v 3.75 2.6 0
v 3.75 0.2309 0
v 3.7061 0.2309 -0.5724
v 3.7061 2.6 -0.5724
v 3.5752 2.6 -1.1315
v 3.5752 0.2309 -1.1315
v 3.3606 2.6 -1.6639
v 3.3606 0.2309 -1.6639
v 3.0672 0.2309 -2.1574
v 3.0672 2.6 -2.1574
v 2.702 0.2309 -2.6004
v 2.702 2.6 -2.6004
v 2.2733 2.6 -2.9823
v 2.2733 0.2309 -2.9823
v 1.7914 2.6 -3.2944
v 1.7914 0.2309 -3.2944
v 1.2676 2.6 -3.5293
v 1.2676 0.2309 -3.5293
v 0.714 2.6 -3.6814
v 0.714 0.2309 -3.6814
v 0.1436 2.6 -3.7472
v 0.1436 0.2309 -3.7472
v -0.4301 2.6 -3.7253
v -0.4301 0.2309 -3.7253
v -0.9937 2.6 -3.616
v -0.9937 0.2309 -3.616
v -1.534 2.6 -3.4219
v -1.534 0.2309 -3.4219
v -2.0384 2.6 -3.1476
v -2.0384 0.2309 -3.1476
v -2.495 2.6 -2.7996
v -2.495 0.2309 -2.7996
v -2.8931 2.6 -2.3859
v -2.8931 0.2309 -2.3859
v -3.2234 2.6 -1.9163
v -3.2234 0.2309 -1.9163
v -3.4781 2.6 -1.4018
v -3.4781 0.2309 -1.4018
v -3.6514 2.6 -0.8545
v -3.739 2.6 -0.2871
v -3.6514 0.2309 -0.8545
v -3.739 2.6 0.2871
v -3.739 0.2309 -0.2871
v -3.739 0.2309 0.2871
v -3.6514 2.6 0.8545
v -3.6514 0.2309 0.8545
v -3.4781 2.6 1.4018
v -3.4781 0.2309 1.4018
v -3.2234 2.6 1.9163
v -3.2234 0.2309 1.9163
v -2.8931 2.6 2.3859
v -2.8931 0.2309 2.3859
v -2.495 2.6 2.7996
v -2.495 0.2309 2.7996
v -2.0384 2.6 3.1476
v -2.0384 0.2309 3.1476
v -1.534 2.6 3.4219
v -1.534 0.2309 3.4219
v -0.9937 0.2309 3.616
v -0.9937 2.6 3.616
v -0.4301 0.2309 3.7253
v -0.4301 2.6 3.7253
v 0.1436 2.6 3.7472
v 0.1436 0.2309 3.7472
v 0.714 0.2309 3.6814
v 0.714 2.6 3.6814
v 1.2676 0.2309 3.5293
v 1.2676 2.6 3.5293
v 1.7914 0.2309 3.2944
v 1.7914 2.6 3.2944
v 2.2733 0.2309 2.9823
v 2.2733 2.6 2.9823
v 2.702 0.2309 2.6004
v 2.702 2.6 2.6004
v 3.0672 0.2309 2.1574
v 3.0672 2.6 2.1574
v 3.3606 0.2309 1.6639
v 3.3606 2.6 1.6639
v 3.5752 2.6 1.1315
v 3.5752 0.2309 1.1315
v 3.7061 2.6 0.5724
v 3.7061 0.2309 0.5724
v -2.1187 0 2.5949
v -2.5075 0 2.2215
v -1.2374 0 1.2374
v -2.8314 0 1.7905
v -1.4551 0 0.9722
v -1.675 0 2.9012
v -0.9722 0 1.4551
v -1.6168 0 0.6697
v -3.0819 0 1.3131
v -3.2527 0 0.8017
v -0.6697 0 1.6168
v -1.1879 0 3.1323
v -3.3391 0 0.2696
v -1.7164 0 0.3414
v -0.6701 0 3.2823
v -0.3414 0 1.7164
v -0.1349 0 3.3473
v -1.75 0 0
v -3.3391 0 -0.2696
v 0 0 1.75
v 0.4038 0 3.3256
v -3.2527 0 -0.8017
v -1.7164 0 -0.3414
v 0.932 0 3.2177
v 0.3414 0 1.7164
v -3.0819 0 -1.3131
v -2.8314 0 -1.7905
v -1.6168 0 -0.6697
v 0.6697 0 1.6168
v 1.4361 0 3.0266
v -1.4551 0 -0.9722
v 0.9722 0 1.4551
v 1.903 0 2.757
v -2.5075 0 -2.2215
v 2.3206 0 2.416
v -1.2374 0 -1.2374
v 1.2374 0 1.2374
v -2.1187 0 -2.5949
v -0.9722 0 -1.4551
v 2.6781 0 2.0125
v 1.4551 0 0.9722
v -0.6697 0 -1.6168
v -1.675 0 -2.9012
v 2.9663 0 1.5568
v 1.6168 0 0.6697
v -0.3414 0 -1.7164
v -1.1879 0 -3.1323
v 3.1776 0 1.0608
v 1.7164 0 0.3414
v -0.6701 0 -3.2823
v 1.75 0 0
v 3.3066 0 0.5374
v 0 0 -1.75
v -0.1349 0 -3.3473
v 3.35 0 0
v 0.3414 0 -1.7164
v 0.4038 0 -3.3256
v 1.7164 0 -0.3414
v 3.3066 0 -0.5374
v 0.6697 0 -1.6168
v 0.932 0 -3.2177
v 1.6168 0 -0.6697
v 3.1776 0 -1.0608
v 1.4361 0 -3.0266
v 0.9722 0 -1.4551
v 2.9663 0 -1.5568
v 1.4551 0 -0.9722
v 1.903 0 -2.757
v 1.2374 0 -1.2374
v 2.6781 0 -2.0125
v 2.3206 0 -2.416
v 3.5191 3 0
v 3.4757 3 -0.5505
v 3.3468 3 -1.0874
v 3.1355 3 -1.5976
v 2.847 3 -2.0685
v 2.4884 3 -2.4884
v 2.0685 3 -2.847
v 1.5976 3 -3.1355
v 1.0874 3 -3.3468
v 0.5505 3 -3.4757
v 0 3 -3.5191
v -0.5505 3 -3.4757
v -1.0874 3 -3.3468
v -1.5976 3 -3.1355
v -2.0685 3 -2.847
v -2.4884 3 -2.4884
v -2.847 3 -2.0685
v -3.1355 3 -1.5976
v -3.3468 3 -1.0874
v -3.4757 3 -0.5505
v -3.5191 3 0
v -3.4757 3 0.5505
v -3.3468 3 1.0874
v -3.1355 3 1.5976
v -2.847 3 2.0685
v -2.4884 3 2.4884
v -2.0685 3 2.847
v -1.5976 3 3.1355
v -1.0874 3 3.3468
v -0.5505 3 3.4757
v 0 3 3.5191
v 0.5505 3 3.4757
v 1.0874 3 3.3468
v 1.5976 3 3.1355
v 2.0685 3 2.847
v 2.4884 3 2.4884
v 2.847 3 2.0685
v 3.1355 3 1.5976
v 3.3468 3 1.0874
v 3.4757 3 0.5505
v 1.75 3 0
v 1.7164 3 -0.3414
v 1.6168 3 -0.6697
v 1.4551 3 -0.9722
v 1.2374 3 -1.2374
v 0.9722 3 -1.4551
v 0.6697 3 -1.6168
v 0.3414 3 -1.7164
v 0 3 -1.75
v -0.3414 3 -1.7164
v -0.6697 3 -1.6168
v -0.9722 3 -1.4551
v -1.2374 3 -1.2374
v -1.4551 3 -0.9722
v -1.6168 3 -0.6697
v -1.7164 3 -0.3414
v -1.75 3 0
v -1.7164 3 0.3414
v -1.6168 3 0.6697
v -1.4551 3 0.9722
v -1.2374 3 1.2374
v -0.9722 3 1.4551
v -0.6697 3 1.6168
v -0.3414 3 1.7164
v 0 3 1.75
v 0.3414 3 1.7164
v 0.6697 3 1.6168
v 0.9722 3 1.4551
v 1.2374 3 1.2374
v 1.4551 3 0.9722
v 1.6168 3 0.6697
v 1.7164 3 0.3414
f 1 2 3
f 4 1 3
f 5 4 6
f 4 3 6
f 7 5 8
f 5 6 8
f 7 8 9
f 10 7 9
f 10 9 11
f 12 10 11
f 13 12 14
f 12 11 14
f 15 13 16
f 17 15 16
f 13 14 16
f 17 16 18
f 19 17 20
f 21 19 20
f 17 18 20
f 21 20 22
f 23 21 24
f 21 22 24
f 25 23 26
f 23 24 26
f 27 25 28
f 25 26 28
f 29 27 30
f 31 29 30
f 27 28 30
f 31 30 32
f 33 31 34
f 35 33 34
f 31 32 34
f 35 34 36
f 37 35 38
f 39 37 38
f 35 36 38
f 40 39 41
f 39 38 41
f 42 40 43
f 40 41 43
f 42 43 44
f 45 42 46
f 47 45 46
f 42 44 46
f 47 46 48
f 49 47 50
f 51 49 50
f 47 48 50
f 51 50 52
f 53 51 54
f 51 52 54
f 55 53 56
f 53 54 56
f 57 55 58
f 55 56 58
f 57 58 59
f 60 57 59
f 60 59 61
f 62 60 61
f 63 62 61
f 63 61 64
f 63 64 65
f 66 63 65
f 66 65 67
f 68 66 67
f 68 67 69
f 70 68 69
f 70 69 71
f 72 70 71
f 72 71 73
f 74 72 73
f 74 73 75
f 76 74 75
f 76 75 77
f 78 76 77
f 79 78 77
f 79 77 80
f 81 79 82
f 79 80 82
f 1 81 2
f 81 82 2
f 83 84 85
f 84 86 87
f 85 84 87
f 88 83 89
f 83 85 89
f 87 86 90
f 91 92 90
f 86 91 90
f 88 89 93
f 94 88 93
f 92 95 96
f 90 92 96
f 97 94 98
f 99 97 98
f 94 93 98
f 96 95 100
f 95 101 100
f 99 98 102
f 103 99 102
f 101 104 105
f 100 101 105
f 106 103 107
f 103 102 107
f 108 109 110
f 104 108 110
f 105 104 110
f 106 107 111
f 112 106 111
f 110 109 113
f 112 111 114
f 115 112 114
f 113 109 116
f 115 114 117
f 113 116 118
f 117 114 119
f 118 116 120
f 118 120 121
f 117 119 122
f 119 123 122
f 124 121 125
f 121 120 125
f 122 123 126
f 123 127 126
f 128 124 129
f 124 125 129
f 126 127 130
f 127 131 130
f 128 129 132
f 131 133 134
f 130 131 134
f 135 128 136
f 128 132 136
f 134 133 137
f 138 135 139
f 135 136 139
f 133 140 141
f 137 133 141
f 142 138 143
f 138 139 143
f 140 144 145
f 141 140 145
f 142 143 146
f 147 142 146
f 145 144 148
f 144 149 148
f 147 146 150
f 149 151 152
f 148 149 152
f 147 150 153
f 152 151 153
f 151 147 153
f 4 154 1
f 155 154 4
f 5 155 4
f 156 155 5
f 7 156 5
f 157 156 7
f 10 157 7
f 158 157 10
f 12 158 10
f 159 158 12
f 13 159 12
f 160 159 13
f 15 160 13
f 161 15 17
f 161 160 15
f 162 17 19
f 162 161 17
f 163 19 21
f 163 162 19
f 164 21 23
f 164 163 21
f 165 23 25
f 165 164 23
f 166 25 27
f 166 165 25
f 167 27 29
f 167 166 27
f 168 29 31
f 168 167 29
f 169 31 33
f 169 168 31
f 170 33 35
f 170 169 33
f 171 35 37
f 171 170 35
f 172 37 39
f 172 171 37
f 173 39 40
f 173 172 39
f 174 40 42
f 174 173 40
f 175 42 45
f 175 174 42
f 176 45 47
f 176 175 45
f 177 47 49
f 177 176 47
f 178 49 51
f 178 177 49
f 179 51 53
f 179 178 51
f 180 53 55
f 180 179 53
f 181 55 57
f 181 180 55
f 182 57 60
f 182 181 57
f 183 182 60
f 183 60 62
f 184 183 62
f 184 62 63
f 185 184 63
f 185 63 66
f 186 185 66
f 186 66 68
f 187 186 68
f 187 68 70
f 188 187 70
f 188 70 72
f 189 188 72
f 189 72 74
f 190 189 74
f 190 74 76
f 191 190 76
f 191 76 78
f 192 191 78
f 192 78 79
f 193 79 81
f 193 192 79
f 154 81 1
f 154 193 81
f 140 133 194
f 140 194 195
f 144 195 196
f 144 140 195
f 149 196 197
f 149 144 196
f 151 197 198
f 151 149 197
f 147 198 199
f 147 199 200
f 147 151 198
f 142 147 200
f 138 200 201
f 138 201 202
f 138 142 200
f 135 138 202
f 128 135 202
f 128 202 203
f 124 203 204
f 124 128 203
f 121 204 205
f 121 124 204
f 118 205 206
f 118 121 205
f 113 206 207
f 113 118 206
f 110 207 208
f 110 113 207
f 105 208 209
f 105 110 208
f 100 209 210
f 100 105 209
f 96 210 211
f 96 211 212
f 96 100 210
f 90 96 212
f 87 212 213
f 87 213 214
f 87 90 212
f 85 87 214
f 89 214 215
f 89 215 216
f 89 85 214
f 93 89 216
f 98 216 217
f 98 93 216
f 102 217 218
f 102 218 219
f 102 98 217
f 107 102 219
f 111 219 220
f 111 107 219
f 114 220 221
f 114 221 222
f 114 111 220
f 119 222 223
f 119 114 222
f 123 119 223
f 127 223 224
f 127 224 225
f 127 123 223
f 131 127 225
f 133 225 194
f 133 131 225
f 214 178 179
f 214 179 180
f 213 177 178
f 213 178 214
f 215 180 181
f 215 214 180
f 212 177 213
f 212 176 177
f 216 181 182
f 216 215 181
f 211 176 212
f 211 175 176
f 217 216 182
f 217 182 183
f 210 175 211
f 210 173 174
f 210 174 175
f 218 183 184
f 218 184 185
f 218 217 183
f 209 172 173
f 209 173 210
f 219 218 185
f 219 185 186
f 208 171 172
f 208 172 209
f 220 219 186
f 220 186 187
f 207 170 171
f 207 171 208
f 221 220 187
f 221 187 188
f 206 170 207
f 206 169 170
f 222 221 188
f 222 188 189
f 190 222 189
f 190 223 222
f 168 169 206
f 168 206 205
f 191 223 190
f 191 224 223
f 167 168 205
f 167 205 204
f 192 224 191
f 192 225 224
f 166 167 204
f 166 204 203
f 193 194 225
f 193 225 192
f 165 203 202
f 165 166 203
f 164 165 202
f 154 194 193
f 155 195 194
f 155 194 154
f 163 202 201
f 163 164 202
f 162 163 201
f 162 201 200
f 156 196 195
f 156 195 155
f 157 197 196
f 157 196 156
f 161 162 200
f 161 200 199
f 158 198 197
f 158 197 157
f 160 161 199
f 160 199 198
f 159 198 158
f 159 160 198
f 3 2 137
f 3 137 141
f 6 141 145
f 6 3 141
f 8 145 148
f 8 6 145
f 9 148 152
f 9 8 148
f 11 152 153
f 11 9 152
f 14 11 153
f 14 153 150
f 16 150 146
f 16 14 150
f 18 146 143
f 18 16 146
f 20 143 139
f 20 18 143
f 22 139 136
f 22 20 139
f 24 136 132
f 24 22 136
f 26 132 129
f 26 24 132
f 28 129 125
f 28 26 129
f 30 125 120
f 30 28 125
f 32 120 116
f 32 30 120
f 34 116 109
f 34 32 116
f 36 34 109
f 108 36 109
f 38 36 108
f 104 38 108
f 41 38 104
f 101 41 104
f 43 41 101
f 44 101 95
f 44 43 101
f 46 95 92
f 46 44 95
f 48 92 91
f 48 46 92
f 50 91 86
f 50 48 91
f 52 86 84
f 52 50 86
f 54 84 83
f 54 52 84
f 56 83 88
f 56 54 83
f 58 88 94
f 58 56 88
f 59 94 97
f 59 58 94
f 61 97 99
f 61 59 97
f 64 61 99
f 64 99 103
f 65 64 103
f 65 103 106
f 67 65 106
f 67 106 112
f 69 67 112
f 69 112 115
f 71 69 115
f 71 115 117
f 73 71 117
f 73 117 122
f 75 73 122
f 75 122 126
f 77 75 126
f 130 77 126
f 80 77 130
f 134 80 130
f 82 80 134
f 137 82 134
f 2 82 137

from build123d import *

# Parameters (mm, degrees)
SKETCH1_R             = 3.75
SKETCH1_R_2           = 1.75
BOSS_EXTRUDE1_DEPTH   = 3
CHAMFER1_SIZE         = 0.4
CHAMFER1_SIZE2        = 0.230940108
CHAMFER1_PART_2_SIZE  = 0.4
CHAMFER1_PART_2_SIZE2 = 0.230940108


with BuildPart() as part:
    # Sketch1 → Boss-Extrude1 (new body)
    with BuildSketch(Plane(origin=(0, 0, 0), x_dir=(1, 0, 0), z_dir=(0, 1, 0))):
        Circle(SKETCH1_R)
        Circle(SKETCH1_R_2, mode=Mode.SUBTRACT)
    extrude(amount=BOSS_EXTRUDE1_DEPTH)

    # Chamfer1
    chamfer1_edges = [part.edges().sort_by_distance(p)[0] for p in [
        (-3.75, 0, 0),
    ]]
    chamfer1_side = [part.faces().sort_by_distance(p)[0] for p in [
        (-3.643933983, 0, 0),
    ]]
    chamfer(chamfer1_edges, length=CHAMFER1_SIZE, length2=CHAMFER1_SIZE2, reference=chamfer1_side[0])

    # Chamfer1 part 2
    chamfer1_part_2_edges = [part.edges().sort_by_distance(p)[0] for p in [
        (-3.75, 3, 0),
    ]]
    chamfer1_part_2_side = [part.faces().sort_by_distance(p)[0] for p in [
        (-3.75, 1.5, 0),
    ]]
    chamfer(chamfer1_part_2_edges, length=CHAMFER1_PART_2_SIZE, length2=CHAMFER1_PART_2_SIZE2, reference=chamfer1_part_2_side[0])


solid = part.part
